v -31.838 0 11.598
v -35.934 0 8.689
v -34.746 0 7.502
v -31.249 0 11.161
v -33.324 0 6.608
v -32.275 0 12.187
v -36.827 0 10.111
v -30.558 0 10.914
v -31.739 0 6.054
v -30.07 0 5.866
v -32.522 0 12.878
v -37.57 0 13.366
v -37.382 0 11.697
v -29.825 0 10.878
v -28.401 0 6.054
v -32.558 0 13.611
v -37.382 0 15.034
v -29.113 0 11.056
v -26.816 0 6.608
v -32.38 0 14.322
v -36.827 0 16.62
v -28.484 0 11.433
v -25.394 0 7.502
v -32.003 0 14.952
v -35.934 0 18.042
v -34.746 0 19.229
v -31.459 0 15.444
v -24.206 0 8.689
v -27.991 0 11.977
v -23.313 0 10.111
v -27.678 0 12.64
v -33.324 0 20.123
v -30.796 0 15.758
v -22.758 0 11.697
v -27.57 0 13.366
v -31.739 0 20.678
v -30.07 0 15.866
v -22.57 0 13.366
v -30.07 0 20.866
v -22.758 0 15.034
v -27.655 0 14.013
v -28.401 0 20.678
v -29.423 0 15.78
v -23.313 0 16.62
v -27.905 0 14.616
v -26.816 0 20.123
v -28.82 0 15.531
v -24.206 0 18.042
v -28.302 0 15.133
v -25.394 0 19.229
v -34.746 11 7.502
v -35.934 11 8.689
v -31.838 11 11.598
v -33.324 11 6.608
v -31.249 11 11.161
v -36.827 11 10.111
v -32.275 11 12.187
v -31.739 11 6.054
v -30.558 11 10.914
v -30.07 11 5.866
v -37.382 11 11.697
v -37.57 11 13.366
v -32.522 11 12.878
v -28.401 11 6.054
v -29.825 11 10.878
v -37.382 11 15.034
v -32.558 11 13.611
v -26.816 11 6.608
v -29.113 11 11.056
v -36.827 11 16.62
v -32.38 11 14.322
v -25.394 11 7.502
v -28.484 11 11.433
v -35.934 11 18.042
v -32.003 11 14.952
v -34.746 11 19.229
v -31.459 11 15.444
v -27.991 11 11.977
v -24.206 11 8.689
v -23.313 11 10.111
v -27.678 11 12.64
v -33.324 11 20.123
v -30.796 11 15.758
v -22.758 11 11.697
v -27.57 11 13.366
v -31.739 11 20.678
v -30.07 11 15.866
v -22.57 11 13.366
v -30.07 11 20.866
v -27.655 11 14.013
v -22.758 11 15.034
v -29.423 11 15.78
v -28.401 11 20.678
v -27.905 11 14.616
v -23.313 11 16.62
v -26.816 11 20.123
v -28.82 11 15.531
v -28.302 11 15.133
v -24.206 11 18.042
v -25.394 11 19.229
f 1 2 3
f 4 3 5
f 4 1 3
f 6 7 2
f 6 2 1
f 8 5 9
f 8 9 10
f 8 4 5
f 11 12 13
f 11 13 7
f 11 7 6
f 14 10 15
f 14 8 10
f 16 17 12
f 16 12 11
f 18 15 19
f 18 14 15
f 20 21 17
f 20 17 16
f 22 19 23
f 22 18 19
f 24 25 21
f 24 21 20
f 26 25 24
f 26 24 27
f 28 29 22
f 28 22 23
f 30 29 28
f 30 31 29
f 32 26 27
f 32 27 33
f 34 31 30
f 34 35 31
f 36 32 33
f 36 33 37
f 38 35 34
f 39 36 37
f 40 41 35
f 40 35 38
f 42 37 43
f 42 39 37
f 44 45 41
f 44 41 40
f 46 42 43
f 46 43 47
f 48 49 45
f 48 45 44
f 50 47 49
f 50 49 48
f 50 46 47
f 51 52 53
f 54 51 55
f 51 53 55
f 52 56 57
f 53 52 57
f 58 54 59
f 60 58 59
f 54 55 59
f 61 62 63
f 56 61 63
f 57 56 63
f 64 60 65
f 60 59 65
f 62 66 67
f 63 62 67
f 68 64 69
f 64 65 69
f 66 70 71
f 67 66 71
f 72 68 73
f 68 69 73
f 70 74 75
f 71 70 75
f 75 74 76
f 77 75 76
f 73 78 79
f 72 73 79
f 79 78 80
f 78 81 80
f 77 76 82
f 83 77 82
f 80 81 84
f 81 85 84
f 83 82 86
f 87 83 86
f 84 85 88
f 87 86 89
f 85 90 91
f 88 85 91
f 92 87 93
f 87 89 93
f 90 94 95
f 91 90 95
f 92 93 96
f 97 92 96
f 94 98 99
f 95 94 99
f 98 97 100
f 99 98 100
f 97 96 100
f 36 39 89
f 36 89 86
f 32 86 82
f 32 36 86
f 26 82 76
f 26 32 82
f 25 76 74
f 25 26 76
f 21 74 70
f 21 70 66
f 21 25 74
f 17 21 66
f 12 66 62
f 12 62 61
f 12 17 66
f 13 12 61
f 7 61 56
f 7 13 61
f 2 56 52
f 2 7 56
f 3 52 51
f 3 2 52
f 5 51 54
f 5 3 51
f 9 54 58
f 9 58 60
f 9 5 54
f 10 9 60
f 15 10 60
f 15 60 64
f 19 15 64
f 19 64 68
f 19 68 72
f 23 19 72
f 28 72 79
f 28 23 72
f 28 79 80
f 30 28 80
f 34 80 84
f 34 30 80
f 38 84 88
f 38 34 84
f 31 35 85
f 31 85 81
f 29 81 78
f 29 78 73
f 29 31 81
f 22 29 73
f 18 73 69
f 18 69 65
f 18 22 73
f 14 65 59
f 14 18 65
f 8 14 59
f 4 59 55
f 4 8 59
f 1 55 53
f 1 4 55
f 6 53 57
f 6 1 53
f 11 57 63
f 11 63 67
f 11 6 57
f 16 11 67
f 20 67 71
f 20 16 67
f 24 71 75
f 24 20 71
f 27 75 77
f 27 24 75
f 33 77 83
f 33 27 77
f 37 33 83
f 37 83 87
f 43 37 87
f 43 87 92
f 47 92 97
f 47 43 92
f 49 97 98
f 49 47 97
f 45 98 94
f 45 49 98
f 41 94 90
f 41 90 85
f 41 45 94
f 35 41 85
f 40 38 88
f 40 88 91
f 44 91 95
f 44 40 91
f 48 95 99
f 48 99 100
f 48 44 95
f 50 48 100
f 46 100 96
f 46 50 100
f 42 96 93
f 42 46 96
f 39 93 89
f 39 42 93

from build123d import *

# Parameters (mm, degrees)
F1_DEPTH = 8
F2_DEPTH = 3
F3_DEPTH = 11


with BuildPart() as f1:
    # F0 (on Front) → F1 (new body)
    with BuildSketch(Plane.XZ):
        with BuildLine():
            ThreePointArc((-30.070162, 46.37237), (-35.632137, 46.568408), (-41.166509, 47.155549))
            ThreePointArc((-41.166509, 47.155549), (-30.070162, -22.199768), (-18.973814, 47.155549))
            ThreePointArc((-18.973814, 47.155549), (-24.508186, 46.568408), (-30.070162, 46.37237))
        make_face()
        with BuildLine():
            ThreePointArc((-22.570162, 13.365558), (-35.373463, 8.062257), (-30.070162, 20.865558))
            ThreePointArc((-30.070162, 20.865558), (-24.766861, 18.668859), (-22.570162, 13.365558))
        make_face(mode=Mode.SUBTRACT)
    extrude(amount=F1_DEPTH)

    # F0 (on Front) → F2 (join)
    with BuildSketch(Plane.XZ):
        with BuildLine():
            ThreePointArc((-30.070162, 56.279502), (-36.966771, 53.357463), (-41.166509, 47.155549))
            ThreePointArc((-41.166509, 47.155549), (-35.632137, 46.568408), (-30.070162, 46.37237))
            Line((-30.070162, 46.37237), (-30.070162, 50.721558))
            ThreePointArc((-30.070162, 50.721558), (-32.070162, 52.721558), (-30.070162, 54.721558))
            Line((-30.070162, 54.721558), (-30.070162, 56.279502))
        make_face()
        with BuildLine():
            ThreePointArc((-30.070162, 46.37237), (-24.508186, 46.568408), (-18.973814, 47.155549))
            ThreePointArc((-18.973814, 47.155549), (-23.173552, 53.357463), (-30.070162, 56.279502))
            Line((-30.070162, 56.279502), (-30.070162, 54.721558))
            ThreePointArc((-30.070162, 54.721558), (-28.655948, 54.135772), (-28.070162, 52.721558))
            ThreePointArc((-28.070162, 52.721558), (-28.655948, 51.307344), (-30.070162, 50.721558))
            Line((-30.070162, 50.721558), (-30.070162, 46.37237))
        make_face()
    extrude(amount=F2_DEPTH)


with BuildPart() as f3:
    # F0 (on Front) → F3 (new body)
    with BuildSketch(Plane.XZ):
        with BuildLine():
            ThreePointArc((-22.570162, 13.365558), (-24.766861, 18.668859), (-30.070162, 20.865558))
            ThreePointArc((-30.070162, 20.865558), (-35.373463, 8.062257), (-22.570162, 13.365558))
        make_face()
        with BuildLine():
            ThreePointArc((-27.570162, 13.365558), (-31.837929, 11.597791), (-30.070162, 15.865558))
            ThreePointArc((-30.070162, 15.865558), (-28.302395, 15.133325), (-27.570162, 13.365558))
        make_face(mode=Mode.SUBTRACT)
    extrude(amount=-F3_DEPTH)


solid = f3.part
